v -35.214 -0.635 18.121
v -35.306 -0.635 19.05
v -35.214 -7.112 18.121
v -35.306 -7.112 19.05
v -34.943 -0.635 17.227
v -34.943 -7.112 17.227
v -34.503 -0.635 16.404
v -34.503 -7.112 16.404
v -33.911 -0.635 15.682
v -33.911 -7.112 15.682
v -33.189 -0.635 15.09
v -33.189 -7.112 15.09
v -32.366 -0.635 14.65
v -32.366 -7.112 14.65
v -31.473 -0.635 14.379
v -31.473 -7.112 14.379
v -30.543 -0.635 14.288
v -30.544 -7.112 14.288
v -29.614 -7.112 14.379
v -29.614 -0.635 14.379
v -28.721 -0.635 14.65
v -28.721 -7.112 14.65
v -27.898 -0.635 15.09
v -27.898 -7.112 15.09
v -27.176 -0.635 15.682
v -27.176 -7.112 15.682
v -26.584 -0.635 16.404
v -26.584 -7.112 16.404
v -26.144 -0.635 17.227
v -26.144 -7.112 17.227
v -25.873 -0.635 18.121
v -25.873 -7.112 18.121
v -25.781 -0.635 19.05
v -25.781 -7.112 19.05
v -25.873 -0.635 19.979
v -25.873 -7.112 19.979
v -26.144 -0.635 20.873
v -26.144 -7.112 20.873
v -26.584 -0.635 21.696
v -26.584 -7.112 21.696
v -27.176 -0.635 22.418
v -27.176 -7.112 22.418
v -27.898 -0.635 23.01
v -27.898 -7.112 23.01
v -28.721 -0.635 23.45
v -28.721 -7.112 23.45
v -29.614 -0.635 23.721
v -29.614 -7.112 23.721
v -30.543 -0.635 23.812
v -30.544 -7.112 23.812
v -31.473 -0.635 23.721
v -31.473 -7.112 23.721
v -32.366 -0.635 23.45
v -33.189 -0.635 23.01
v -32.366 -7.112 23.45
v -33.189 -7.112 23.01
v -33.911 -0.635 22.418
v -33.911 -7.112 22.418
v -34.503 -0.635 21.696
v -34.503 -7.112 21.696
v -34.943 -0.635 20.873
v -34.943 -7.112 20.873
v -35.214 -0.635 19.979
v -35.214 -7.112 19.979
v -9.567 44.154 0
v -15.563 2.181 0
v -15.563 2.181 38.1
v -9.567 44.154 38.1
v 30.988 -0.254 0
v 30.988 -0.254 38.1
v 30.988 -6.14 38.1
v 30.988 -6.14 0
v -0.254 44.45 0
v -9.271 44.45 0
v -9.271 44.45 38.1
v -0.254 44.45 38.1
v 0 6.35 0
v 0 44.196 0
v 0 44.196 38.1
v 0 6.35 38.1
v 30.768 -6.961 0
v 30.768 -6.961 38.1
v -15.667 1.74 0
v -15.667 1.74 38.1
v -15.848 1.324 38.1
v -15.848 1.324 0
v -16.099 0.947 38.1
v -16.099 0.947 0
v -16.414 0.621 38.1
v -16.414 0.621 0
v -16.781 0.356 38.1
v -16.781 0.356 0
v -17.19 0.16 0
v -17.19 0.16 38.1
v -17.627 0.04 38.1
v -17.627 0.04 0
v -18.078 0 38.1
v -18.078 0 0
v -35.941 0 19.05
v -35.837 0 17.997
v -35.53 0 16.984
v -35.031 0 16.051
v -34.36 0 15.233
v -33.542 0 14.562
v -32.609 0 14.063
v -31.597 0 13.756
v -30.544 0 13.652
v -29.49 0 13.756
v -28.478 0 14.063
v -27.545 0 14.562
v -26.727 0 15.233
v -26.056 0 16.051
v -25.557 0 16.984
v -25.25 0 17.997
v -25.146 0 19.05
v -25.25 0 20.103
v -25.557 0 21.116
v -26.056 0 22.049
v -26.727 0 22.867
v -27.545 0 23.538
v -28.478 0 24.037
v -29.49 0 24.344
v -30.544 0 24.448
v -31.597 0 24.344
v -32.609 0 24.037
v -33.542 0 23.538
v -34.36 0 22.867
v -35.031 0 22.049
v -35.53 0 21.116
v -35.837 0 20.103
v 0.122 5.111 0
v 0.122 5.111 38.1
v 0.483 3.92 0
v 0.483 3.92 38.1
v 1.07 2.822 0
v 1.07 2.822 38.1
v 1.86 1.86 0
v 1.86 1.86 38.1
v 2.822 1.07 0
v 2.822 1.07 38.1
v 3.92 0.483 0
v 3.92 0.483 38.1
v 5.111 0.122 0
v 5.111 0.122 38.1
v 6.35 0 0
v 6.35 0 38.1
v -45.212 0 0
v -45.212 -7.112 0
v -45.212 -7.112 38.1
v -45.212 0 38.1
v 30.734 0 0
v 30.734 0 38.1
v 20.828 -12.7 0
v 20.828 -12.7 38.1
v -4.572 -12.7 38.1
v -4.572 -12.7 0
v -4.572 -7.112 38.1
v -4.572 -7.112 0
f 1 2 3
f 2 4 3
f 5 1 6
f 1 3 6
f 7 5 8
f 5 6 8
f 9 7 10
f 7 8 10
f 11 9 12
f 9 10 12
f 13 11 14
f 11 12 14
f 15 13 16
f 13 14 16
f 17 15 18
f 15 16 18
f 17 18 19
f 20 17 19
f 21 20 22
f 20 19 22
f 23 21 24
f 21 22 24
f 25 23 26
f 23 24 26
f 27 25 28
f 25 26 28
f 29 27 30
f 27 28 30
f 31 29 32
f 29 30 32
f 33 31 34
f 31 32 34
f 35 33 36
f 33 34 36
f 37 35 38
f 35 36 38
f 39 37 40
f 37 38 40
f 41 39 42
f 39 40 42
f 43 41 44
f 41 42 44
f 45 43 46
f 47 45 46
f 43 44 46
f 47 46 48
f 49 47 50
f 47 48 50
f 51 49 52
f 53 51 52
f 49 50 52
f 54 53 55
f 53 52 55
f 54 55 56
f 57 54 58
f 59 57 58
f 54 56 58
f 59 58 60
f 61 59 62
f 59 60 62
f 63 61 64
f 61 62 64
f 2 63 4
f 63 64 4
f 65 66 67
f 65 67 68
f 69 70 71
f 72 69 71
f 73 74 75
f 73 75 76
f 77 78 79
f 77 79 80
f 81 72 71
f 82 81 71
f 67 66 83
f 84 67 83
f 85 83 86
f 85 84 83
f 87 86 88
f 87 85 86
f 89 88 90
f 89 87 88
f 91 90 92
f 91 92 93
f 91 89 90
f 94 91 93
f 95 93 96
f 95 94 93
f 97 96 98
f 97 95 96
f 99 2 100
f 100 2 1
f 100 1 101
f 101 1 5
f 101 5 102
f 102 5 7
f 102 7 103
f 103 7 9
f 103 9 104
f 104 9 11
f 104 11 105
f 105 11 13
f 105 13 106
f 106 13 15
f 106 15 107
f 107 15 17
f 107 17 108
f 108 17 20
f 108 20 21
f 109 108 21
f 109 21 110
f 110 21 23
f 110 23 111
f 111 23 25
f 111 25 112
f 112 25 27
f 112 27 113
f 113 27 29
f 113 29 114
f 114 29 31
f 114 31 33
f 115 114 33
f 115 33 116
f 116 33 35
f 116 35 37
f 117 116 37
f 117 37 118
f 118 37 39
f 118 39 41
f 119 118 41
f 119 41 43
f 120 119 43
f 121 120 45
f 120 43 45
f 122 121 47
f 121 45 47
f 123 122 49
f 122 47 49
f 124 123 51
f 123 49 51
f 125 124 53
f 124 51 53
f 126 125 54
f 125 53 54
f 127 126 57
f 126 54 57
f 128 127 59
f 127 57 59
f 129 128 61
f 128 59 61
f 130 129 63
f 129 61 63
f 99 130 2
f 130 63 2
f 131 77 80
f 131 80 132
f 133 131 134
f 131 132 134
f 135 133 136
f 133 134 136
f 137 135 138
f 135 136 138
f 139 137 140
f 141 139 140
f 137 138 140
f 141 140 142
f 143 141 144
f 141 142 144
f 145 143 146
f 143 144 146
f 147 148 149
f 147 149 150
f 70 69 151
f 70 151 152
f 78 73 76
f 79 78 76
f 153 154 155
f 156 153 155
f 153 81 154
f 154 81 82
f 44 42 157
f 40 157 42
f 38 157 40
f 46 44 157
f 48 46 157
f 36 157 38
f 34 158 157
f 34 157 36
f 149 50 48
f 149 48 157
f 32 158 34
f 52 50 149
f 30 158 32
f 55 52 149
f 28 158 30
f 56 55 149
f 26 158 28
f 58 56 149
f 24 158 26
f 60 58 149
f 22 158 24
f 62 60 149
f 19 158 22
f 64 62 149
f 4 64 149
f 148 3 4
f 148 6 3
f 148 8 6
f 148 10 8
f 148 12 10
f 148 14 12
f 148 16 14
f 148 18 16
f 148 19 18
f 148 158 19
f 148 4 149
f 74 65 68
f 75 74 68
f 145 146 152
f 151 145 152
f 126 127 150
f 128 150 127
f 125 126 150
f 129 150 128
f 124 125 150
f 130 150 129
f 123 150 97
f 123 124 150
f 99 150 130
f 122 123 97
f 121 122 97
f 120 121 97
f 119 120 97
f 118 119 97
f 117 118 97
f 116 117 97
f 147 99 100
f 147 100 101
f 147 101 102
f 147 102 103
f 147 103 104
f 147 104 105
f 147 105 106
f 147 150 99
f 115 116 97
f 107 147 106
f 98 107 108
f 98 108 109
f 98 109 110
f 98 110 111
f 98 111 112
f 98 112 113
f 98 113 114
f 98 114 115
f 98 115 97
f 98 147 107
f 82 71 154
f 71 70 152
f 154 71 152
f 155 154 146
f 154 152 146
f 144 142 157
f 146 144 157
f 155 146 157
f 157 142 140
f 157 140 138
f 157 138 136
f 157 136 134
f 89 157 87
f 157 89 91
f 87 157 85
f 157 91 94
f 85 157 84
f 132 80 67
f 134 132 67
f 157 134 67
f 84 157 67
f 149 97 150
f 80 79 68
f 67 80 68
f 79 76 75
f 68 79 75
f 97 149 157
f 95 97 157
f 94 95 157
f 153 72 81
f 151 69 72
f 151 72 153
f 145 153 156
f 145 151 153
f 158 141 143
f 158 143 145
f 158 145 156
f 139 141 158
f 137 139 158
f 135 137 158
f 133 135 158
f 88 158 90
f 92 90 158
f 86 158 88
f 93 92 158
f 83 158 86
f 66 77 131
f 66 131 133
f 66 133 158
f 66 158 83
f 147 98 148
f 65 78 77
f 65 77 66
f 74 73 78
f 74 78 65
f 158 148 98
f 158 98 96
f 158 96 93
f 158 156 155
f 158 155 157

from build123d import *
from OCP.BRepFilletAPI import BRepFilletAPI_MakeChamfer

# Parameters (mm, degrees)
BOSS_EXTRUDE1_DEPTH                    = 38.1
F_3_8_0_375_DIAMETER_HOLE1_D           = 9.525
F_3_8_0_375_DIAMETER_HOLE1_CSINK_D     = 10.795
F_3_8_0_375_DIAMETER_HOLE1_CSINK_ANGLE = 90
CHAMFER1_SIZE                          = 10.16
CHAMFER1_SIZE2                         = 5.865878735
FILLET1_R                              = 2.54
FILLET2_R                              = 6.35
CHAMFER2_SIZE                          = 0.254
CHAMFER2_SIZE2                         = 0.299341871
CHAMFER2_SIZE2_2                       = 0.693940905


with BuildPart() as part:
    # Sketch1 → Boss-Extrude1 (new body)
    with BuildSketch(Plane.XY):
        Polygon((0, 0), (30.988, 0), (30.988, -12.7), (-4.572, -12.7), (-4.572, -7.112), (-45.212, -7.112), (-45.212, 0), (-15.875, 0), (-9.525, 44.45), (0, 44.45), align=None)
    extrude(amount=BOSS_EXTRUDE1_DEPTH)

    # 3/8 (0.375) Diameter Hole1 (through all)
    with Locations(Plane(origin=(0, 0, 0), x_dir=(1, 0, 0), z_dir=(0, 1, 0))):
        with Locations((-30.5435, -19.05)):
            CounterSinkHole(F_3_8_0_375_DIAMETER_HOLE1_D / 2, F_3_8_0_375_DIAMETER_HOLE1_CSINK_D / 2, counter_sink_angle=F_3_8_0_375_DIAMETER_HOLE1_CSINK_ANGLE)

    # Chamfer1
    chamfer1_edges = [part.edges().sort_by_distance(p)[0] for p in [
        (30.988, -12.7, 19.05),
    ]]
    chamfer1_side = [part.faces().sort_by_distance(p)[0] for p in [
        (13.208, -12.7, 19.05),
    ]]
    chamfer(chamfer1_edges, length=CHAMFER1_SIZE, length2=CHAMFER1_SIZE2, reference=chamfer1_side[0])

    # Fillet1
    fillet1_edges = [part.edges().sort_by_distance(p)[0] for p in [
        (-15.875, 0, 19.05),
    ]]
    fillet(fillet1_edges, radius=FILLET1_R)

    # Fillet2
    fillet2_edges = [part.edges().sort_by_distance(p)[0] for p in [
        (0, 0, 19.05),
    ]]
    fillet(fillet2_edges, radius=FILLET2_R)

    # Chamfer2: one chamfer whose edges measure the first distance from different faces: ONE call of the kernel's chamfer builder (chamfer() names one face for all edges)
    chamfer2_edges_1 = [part.edges().sort_by_distance(p)[0] for p in [
        (30.988, 0, 19.05),
        (0, 44.45, 19.05),
    ]]
    chamfer2_edges_2 = [part.edges().sort_by_distance(p)[0] for p in [
        (-9.525, 44.45, 19.05),
    ]]
    chamfer2_side_2 = [part.faces().sort_by_distance(p)[0] for p in [
        (-4.7625, 44.45, 19.05),
    ]]
    chamfer2_edges_3 = [part.edges().sort_by_distance(p)[0] for p in [
        (30.988, -6.834121265, 19.05),
    ]]
    chamfer2_side_3 = [part.faces().sort_by_distance(p)[0] for p in [
        (25.908, -9.767060633, 19.05),
    ]]
    chamfer2 = BRepFilletAPI_MakeChamfer(part.part.solid().wrapped)
    for e in chamfer2_edges_1:
        chamfer2.Add(CHAMFER2_SIZE, e.wrapped)
    for e in chamfer2_edges_2:
        chamfer2.Add(CHAMFER2_SIZE, CHAMFER2_SIZE2, e.wrapped, chamfer2_side_2[0].wrapped)  # the first distance lies on this face
    for e in chamfer2_edges_3:
        chamfer2.Add(CHAMFER2_SIZE, CHAMFER2_SIZE2_2, e.wrapped, chamfer2_side_3[0].wrapped)  # the first distance lies on this face
    add(Compound.cast(chamfer2.Shape()), mode=Mode.REPLACE)


solid = part.part
